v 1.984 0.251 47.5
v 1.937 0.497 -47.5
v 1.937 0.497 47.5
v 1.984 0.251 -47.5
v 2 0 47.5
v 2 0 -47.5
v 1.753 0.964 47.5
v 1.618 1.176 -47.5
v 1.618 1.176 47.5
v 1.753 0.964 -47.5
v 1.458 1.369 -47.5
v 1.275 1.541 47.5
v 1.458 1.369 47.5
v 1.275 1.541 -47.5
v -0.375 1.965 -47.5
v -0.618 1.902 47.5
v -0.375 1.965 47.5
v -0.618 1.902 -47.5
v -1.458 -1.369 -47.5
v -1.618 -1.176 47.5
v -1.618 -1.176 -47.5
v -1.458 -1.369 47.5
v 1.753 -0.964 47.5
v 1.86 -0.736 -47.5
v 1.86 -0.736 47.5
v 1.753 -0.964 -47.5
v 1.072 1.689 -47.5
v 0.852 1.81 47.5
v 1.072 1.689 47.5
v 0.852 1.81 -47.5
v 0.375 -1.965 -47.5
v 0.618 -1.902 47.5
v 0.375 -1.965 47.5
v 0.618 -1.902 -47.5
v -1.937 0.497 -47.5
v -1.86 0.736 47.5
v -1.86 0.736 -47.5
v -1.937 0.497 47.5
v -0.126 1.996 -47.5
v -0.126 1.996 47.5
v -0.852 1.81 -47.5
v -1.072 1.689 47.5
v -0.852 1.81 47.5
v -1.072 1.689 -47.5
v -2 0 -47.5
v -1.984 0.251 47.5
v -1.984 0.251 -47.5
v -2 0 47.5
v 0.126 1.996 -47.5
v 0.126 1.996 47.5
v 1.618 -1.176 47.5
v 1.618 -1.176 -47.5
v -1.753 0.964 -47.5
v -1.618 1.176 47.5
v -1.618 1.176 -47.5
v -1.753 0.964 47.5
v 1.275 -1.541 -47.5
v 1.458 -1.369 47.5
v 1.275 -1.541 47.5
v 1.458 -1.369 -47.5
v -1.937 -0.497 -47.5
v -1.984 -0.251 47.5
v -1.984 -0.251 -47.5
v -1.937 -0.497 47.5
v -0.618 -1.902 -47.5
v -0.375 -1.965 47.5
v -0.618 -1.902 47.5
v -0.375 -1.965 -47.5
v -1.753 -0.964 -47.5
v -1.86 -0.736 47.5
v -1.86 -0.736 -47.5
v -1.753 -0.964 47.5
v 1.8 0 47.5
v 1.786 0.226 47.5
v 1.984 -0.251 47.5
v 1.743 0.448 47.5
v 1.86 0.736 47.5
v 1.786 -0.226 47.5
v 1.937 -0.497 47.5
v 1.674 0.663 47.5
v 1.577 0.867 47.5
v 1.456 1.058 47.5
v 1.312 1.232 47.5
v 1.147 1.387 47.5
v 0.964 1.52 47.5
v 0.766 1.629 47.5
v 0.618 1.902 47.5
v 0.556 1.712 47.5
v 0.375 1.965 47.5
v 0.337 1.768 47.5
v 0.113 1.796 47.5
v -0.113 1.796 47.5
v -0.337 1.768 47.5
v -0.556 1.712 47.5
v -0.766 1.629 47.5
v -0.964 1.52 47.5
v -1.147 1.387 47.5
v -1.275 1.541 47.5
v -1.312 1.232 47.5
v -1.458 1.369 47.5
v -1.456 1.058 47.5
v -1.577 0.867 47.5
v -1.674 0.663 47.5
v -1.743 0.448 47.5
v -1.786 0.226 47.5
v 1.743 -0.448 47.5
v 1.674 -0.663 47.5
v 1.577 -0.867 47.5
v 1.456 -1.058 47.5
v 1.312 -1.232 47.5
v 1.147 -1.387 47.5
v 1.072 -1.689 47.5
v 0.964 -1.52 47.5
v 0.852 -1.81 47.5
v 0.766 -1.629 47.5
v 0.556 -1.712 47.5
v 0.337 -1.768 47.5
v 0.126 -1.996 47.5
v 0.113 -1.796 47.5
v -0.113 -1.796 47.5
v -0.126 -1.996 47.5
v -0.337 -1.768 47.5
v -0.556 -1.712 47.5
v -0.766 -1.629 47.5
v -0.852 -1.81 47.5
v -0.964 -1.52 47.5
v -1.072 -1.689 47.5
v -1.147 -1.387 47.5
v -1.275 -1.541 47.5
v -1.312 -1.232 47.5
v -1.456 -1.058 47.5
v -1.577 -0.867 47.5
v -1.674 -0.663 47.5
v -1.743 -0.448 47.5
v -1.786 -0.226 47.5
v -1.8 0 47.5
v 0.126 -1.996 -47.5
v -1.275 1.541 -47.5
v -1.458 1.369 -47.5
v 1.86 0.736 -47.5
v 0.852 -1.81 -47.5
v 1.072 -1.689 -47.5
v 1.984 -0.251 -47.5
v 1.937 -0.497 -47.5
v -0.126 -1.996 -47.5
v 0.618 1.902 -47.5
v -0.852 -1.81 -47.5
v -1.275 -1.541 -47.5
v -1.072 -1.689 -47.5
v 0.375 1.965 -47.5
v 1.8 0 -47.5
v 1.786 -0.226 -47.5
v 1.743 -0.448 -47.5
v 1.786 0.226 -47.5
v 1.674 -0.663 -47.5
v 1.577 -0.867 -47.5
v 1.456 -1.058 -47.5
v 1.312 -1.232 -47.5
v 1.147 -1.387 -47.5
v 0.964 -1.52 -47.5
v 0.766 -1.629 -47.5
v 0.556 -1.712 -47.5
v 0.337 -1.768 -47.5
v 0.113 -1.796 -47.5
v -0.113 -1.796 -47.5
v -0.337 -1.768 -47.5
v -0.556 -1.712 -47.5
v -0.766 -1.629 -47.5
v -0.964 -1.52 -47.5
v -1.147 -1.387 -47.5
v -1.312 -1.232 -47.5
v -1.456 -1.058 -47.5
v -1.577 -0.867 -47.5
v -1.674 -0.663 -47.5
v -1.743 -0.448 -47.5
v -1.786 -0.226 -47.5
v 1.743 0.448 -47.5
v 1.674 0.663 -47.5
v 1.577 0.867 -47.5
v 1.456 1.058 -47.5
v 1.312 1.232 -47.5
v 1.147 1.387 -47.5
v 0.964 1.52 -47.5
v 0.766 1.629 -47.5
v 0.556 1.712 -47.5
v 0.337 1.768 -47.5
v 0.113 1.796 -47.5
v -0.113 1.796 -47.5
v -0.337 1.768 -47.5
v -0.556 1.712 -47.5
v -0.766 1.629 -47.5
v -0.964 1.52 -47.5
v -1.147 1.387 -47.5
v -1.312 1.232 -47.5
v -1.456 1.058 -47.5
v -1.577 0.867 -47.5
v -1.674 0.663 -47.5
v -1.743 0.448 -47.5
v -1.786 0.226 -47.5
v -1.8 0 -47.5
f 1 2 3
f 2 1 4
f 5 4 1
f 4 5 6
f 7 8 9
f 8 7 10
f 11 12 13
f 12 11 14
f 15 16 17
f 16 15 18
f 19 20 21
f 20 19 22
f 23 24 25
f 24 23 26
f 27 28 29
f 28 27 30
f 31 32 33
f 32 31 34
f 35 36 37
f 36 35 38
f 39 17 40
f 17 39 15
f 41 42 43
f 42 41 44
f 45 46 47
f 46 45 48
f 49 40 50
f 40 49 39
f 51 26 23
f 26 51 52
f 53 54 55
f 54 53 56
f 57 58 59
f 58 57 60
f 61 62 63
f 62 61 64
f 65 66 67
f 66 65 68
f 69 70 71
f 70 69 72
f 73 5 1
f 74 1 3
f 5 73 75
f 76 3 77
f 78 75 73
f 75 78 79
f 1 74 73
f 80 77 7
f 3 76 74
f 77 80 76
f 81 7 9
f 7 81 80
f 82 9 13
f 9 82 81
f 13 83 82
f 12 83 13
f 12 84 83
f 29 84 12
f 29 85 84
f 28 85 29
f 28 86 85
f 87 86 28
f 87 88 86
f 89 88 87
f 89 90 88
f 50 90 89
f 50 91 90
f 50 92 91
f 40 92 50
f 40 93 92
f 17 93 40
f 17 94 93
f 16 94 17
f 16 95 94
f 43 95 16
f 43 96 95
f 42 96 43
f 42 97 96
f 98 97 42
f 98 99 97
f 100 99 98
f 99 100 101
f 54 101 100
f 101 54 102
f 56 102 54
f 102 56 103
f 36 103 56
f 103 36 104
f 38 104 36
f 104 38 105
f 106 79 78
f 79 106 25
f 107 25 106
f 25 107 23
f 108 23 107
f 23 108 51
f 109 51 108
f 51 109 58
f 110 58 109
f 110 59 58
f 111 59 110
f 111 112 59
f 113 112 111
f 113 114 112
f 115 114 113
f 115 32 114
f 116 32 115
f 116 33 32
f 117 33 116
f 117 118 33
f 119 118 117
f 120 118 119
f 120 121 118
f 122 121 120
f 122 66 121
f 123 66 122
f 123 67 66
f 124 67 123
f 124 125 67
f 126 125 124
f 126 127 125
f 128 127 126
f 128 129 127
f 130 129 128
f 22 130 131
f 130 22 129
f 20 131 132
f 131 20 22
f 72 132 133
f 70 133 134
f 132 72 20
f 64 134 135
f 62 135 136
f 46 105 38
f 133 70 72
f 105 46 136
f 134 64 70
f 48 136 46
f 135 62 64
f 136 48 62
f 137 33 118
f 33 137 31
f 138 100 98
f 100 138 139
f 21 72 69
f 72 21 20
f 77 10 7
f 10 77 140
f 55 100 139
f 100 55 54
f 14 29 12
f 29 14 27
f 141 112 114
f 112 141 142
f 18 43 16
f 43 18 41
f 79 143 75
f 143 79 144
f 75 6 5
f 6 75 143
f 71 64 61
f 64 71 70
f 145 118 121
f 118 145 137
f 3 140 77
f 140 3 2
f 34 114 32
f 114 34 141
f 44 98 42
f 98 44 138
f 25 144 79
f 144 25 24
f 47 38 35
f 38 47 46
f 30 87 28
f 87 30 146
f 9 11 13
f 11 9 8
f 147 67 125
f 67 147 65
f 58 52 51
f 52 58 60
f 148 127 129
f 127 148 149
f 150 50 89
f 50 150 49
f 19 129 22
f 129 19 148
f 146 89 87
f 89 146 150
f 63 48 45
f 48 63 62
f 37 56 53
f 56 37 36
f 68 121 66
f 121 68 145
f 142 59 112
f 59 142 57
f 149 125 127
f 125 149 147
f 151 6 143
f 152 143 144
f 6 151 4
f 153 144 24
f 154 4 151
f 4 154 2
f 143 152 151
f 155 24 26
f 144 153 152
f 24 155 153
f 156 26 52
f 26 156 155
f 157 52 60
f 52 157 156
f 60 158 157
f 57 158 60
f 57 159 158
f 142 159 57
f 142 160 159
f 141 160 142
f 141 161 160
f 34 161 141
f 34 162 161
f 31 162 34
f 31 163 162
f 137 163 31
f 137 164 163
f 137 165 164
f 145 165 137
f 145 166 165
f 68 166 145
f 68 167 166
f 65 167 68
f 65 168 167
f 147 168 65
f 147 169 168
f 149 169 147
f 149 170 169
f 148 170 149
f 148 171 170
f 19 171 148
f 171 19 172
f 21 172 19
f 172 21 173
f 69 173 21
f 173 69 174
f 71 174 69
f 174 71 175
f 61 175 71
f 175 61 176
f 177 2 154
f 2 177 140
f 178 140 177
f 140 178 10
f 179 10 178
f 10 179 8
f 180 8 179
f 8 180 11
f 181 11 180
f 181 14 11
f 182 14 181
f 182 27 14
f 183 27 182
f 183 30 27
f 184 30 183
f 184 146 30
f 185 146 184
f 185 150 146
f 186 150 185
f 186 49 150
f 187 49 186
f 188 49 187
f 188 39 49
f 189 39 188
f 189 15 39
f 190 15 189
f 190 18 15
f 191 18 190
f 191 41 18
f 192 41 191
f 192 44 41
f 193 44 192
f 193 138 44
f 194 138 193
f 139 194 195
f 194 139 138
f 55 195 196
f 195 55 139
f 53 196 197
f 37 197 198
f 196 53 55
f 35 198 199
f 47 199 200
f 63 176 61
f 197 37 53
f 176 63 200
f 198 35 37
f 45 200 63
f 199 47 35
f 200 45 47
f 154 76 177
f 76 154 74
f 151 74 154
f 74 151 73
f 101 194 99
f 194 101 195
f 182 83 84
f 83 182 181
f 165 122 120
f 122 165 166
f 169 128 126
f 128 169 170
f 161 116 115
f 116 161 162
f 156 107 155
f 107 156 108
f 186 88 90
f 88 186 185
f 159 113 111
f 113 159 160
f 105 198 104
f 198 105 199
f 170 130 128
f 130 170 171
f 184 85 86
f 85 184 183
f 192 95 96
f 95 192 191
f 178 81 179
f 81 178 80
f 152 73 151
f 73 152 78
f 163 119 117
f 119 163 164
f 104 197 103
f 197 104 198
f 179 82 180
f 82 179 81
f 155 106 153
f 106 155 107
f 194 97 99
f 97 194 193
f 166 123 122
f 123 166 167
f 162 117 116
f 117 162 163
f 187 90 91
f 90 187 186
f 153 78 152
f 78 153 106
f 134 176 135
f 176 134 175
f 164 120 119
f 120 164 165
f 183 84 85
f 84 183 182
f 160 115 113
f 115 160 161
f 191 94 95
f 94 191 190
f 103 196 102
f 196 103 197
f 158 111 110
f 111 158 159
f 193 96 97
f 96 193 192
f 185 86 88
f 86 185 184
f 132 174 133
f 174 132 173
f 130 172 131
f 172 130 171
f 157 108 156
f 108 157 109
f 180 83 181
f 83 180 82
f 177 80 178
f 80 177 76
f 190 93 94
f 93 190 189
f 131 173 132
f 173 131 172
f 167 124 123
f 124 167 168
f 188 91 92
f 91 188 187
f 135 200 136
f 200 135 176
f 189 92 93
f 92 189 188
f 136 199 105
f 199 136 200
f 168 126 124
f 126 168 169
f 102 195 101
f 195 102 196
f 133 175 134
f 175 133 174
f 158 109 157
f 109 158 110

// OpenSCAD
$fn = 50;


difference() {
	union() {
		translate(v = [0, 0, -47.5000000000]) {
			cylinder(h = 95, r = 2.0000000000);
		}
	}
	union() {
		#translate(v = [0, 0, -100.0000000000]) {
			cylinder(h = 200, r = 1.8000000000);
		}
	}
}
